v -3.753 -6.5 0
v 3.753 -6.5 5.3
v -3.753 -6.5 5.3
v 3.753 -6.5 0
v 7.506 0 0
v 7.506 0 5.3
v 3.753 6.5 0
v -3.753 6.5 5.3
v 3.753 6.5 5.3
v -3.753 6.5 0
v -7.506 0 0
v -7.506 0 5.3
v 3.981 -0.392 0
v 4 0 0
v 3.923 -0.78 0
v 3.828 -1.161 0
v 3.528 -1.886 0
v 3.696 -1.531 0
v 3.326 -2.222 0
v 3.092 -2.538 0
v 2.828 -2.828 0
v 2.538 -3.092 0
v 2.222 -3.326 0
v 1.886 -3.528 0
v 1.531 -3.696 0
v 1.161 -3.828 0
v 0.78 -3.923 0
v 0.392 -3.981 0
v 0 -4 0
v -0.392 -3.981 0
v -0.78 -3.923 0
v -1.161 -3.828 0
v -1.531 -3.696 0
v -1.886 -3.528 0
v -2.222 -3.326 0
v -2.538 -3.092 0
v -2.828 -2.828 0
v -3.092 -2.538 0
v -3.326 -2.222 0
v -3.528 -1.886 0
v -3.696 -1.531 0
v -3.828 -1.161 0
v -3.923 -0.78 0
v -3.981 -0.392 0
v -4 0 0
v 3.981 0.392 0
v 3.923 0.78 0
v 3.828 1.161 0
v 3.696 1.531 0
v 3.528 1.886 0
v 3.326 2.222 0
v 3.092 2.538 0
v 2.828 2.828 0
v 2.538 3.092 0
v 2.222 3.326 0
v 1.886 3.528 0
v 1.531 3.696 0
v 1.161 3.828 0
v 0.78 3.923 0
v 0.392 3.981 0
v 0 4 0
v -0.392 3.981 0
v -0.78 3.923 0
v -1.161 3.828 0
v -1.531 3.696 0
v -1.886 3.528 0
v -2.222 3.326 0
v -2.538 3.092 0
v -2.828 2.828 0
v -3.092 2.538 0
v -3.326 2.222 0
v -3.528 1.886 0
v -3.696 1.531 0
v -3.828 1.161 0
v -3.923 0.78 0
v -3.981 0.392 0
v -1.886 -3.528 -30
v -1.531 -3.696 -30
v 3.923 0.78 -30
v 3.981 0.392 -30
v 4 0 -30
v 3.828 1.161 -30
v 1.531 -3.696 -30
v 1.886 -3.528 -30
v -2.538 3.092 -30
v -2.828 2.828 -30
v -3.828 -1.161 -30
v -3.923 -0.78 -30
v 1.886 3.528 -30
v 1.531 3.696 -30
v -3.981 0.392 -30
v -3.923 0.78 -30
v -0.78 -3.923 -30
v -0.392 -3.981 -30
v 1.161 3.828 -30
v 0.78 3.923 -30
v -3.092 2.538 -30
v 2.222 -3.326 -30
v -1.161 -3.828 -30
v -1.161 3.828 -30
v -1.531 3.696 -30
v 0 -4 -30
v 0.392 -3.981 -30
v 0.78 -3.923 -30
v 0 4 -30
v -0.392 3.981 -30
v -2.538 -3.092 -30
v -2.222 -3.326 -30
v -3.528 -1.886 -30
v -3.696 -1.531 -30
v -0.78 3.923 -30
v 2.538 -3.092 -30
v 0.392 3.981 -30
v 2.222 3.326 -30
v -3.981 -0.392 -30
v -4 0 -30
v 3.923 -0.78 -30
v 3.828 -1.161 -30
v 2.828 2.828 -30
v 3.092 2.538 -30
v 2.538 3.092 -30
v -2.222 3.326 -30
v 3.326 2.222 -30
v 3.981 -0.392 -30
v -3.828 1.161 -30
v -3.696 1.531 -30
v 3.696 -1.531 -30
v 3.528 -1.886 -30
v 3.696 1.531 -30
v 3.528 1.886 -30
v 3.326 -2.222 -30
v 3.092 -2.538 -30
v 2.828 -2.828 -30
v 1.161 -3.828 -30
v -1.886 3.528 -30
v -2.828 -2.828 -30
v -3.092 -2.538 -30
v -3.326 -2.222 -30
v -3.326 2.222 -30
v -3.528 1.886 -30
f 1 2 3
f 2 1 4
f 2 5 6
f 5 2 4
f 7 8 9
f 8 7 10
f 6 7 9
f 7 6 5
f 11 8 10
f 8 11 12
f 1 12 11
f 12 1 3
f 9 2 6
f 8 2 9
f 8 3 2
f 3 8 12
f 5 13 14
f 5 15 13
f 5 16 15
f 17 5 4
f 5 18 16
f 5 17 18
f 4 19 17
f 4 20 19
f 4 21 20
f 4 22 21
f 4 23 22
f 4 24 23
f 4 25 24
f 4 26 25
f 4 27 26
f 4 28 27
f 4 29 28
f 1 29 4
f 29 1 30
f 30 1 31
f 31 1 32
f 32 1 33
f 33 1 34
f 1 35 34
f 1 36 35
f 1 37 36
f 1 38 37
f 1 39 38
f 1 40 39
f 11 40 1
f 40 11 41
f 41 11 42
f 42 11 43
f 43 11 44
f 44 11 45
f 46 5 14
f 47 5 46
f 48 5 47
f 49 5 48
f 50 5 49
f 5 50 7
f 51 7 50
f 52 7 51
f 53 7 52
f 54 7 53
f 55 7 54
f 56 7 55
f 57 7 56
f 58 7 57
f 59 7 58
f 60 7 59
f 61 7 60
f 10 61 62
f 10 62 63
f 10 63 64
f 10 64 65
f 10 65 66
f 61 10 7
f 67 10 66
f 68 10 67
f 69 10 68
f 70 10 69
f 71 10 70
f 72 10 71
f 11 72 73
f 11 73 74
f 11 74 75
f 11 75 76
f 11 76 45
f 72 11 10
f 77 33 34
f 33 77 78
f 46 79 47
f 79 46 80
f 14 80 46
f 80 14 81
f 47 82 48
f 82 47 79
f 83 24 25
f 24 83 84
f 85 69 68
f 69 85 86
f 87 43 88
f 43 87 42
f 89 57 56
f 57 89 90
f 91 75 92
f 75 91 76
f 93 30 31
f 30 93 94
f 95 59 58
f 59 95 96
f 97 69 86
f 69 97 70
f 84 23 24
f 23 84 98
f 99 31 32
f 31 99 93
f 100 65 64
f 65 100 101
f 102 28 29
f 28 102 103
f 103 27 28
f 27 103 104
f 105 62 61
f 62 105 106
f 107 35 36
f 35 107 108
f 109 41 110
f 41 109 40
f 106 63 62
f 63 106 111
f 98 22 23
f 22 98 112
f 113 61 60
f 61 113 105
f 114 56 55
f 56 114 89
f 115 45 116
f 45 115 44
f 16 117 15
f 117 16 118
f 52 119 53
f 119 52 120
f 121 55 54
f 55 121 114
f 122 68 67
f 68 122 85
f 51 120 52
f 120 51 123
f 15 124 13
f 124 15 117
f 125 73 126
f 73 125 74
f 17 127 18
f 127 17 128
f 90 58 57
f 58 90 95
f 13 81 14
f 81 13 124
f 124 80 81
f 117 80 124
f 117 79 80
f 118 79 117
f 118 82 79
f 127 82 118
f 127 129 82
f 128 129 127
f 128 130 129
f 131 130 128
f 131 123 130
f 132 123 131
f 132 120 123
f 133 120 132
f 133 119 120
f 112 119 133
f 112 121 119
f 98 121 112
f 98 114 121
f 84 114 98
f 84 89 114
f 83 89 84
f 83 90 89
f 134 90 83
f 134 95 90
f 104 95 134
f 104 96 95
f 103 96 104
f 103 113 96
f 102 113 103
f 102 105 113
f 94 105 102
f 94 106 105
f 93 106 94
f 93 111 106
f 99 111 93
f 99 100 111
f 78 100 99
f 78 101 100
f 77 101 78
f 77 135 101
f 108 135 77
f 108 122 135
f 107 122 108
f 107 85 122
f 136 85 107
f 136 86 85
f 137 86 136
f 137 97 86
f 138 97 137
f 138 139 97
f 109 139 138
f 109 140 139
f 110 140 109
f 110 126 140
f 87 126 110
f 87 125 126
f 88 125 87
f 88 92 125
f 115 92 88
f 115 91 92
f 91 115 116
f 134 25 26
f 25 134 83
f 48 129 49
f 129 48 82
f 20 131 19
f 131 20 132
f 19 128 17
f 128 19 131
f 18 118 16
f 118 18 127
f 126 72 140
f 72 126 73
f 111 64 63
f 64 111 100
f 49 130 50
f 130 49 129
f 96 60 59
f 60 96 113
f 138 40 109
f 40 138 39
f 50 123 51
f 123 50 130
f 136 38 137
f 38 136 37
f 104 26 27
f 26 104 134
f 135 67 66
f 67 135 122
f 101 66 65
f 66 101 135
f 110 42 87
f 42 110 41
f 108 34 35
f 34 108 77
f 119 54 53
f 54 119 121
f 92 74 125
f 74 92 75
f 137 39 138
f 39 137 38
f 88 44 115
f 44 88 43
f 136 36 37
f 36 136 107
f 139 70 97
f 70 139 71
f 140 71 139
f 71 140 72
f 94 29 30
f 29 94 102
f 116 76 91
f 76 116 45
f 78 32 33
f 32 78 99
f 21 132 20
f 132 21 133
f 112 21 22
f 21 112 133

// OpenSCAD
// M8 六角ボルト (ねじ山なし)

// 頭部の円周方向の滑らかさを設定
$fn = 64;

// 頭部: 対辺距離 13mm、高さ 5.3mm
// OpenSCADのcylinder(fn=6)は「半径」を指定するため、対辺距離(13mm)の半分である「内接円半径」を計算
// 内接円半径 = 対辺距離 / 2 = 6.5mm
cylinder(r = 6.5 / cos(180/6), h = 5.3, $fn = 6);

// シャンク: 直径 8mm、長さ 30mm
// z=0の位置から z<0 側へ伸ばす
translate([0, 0, -30])
cylinder(r = 8 / 2, h = 30);
